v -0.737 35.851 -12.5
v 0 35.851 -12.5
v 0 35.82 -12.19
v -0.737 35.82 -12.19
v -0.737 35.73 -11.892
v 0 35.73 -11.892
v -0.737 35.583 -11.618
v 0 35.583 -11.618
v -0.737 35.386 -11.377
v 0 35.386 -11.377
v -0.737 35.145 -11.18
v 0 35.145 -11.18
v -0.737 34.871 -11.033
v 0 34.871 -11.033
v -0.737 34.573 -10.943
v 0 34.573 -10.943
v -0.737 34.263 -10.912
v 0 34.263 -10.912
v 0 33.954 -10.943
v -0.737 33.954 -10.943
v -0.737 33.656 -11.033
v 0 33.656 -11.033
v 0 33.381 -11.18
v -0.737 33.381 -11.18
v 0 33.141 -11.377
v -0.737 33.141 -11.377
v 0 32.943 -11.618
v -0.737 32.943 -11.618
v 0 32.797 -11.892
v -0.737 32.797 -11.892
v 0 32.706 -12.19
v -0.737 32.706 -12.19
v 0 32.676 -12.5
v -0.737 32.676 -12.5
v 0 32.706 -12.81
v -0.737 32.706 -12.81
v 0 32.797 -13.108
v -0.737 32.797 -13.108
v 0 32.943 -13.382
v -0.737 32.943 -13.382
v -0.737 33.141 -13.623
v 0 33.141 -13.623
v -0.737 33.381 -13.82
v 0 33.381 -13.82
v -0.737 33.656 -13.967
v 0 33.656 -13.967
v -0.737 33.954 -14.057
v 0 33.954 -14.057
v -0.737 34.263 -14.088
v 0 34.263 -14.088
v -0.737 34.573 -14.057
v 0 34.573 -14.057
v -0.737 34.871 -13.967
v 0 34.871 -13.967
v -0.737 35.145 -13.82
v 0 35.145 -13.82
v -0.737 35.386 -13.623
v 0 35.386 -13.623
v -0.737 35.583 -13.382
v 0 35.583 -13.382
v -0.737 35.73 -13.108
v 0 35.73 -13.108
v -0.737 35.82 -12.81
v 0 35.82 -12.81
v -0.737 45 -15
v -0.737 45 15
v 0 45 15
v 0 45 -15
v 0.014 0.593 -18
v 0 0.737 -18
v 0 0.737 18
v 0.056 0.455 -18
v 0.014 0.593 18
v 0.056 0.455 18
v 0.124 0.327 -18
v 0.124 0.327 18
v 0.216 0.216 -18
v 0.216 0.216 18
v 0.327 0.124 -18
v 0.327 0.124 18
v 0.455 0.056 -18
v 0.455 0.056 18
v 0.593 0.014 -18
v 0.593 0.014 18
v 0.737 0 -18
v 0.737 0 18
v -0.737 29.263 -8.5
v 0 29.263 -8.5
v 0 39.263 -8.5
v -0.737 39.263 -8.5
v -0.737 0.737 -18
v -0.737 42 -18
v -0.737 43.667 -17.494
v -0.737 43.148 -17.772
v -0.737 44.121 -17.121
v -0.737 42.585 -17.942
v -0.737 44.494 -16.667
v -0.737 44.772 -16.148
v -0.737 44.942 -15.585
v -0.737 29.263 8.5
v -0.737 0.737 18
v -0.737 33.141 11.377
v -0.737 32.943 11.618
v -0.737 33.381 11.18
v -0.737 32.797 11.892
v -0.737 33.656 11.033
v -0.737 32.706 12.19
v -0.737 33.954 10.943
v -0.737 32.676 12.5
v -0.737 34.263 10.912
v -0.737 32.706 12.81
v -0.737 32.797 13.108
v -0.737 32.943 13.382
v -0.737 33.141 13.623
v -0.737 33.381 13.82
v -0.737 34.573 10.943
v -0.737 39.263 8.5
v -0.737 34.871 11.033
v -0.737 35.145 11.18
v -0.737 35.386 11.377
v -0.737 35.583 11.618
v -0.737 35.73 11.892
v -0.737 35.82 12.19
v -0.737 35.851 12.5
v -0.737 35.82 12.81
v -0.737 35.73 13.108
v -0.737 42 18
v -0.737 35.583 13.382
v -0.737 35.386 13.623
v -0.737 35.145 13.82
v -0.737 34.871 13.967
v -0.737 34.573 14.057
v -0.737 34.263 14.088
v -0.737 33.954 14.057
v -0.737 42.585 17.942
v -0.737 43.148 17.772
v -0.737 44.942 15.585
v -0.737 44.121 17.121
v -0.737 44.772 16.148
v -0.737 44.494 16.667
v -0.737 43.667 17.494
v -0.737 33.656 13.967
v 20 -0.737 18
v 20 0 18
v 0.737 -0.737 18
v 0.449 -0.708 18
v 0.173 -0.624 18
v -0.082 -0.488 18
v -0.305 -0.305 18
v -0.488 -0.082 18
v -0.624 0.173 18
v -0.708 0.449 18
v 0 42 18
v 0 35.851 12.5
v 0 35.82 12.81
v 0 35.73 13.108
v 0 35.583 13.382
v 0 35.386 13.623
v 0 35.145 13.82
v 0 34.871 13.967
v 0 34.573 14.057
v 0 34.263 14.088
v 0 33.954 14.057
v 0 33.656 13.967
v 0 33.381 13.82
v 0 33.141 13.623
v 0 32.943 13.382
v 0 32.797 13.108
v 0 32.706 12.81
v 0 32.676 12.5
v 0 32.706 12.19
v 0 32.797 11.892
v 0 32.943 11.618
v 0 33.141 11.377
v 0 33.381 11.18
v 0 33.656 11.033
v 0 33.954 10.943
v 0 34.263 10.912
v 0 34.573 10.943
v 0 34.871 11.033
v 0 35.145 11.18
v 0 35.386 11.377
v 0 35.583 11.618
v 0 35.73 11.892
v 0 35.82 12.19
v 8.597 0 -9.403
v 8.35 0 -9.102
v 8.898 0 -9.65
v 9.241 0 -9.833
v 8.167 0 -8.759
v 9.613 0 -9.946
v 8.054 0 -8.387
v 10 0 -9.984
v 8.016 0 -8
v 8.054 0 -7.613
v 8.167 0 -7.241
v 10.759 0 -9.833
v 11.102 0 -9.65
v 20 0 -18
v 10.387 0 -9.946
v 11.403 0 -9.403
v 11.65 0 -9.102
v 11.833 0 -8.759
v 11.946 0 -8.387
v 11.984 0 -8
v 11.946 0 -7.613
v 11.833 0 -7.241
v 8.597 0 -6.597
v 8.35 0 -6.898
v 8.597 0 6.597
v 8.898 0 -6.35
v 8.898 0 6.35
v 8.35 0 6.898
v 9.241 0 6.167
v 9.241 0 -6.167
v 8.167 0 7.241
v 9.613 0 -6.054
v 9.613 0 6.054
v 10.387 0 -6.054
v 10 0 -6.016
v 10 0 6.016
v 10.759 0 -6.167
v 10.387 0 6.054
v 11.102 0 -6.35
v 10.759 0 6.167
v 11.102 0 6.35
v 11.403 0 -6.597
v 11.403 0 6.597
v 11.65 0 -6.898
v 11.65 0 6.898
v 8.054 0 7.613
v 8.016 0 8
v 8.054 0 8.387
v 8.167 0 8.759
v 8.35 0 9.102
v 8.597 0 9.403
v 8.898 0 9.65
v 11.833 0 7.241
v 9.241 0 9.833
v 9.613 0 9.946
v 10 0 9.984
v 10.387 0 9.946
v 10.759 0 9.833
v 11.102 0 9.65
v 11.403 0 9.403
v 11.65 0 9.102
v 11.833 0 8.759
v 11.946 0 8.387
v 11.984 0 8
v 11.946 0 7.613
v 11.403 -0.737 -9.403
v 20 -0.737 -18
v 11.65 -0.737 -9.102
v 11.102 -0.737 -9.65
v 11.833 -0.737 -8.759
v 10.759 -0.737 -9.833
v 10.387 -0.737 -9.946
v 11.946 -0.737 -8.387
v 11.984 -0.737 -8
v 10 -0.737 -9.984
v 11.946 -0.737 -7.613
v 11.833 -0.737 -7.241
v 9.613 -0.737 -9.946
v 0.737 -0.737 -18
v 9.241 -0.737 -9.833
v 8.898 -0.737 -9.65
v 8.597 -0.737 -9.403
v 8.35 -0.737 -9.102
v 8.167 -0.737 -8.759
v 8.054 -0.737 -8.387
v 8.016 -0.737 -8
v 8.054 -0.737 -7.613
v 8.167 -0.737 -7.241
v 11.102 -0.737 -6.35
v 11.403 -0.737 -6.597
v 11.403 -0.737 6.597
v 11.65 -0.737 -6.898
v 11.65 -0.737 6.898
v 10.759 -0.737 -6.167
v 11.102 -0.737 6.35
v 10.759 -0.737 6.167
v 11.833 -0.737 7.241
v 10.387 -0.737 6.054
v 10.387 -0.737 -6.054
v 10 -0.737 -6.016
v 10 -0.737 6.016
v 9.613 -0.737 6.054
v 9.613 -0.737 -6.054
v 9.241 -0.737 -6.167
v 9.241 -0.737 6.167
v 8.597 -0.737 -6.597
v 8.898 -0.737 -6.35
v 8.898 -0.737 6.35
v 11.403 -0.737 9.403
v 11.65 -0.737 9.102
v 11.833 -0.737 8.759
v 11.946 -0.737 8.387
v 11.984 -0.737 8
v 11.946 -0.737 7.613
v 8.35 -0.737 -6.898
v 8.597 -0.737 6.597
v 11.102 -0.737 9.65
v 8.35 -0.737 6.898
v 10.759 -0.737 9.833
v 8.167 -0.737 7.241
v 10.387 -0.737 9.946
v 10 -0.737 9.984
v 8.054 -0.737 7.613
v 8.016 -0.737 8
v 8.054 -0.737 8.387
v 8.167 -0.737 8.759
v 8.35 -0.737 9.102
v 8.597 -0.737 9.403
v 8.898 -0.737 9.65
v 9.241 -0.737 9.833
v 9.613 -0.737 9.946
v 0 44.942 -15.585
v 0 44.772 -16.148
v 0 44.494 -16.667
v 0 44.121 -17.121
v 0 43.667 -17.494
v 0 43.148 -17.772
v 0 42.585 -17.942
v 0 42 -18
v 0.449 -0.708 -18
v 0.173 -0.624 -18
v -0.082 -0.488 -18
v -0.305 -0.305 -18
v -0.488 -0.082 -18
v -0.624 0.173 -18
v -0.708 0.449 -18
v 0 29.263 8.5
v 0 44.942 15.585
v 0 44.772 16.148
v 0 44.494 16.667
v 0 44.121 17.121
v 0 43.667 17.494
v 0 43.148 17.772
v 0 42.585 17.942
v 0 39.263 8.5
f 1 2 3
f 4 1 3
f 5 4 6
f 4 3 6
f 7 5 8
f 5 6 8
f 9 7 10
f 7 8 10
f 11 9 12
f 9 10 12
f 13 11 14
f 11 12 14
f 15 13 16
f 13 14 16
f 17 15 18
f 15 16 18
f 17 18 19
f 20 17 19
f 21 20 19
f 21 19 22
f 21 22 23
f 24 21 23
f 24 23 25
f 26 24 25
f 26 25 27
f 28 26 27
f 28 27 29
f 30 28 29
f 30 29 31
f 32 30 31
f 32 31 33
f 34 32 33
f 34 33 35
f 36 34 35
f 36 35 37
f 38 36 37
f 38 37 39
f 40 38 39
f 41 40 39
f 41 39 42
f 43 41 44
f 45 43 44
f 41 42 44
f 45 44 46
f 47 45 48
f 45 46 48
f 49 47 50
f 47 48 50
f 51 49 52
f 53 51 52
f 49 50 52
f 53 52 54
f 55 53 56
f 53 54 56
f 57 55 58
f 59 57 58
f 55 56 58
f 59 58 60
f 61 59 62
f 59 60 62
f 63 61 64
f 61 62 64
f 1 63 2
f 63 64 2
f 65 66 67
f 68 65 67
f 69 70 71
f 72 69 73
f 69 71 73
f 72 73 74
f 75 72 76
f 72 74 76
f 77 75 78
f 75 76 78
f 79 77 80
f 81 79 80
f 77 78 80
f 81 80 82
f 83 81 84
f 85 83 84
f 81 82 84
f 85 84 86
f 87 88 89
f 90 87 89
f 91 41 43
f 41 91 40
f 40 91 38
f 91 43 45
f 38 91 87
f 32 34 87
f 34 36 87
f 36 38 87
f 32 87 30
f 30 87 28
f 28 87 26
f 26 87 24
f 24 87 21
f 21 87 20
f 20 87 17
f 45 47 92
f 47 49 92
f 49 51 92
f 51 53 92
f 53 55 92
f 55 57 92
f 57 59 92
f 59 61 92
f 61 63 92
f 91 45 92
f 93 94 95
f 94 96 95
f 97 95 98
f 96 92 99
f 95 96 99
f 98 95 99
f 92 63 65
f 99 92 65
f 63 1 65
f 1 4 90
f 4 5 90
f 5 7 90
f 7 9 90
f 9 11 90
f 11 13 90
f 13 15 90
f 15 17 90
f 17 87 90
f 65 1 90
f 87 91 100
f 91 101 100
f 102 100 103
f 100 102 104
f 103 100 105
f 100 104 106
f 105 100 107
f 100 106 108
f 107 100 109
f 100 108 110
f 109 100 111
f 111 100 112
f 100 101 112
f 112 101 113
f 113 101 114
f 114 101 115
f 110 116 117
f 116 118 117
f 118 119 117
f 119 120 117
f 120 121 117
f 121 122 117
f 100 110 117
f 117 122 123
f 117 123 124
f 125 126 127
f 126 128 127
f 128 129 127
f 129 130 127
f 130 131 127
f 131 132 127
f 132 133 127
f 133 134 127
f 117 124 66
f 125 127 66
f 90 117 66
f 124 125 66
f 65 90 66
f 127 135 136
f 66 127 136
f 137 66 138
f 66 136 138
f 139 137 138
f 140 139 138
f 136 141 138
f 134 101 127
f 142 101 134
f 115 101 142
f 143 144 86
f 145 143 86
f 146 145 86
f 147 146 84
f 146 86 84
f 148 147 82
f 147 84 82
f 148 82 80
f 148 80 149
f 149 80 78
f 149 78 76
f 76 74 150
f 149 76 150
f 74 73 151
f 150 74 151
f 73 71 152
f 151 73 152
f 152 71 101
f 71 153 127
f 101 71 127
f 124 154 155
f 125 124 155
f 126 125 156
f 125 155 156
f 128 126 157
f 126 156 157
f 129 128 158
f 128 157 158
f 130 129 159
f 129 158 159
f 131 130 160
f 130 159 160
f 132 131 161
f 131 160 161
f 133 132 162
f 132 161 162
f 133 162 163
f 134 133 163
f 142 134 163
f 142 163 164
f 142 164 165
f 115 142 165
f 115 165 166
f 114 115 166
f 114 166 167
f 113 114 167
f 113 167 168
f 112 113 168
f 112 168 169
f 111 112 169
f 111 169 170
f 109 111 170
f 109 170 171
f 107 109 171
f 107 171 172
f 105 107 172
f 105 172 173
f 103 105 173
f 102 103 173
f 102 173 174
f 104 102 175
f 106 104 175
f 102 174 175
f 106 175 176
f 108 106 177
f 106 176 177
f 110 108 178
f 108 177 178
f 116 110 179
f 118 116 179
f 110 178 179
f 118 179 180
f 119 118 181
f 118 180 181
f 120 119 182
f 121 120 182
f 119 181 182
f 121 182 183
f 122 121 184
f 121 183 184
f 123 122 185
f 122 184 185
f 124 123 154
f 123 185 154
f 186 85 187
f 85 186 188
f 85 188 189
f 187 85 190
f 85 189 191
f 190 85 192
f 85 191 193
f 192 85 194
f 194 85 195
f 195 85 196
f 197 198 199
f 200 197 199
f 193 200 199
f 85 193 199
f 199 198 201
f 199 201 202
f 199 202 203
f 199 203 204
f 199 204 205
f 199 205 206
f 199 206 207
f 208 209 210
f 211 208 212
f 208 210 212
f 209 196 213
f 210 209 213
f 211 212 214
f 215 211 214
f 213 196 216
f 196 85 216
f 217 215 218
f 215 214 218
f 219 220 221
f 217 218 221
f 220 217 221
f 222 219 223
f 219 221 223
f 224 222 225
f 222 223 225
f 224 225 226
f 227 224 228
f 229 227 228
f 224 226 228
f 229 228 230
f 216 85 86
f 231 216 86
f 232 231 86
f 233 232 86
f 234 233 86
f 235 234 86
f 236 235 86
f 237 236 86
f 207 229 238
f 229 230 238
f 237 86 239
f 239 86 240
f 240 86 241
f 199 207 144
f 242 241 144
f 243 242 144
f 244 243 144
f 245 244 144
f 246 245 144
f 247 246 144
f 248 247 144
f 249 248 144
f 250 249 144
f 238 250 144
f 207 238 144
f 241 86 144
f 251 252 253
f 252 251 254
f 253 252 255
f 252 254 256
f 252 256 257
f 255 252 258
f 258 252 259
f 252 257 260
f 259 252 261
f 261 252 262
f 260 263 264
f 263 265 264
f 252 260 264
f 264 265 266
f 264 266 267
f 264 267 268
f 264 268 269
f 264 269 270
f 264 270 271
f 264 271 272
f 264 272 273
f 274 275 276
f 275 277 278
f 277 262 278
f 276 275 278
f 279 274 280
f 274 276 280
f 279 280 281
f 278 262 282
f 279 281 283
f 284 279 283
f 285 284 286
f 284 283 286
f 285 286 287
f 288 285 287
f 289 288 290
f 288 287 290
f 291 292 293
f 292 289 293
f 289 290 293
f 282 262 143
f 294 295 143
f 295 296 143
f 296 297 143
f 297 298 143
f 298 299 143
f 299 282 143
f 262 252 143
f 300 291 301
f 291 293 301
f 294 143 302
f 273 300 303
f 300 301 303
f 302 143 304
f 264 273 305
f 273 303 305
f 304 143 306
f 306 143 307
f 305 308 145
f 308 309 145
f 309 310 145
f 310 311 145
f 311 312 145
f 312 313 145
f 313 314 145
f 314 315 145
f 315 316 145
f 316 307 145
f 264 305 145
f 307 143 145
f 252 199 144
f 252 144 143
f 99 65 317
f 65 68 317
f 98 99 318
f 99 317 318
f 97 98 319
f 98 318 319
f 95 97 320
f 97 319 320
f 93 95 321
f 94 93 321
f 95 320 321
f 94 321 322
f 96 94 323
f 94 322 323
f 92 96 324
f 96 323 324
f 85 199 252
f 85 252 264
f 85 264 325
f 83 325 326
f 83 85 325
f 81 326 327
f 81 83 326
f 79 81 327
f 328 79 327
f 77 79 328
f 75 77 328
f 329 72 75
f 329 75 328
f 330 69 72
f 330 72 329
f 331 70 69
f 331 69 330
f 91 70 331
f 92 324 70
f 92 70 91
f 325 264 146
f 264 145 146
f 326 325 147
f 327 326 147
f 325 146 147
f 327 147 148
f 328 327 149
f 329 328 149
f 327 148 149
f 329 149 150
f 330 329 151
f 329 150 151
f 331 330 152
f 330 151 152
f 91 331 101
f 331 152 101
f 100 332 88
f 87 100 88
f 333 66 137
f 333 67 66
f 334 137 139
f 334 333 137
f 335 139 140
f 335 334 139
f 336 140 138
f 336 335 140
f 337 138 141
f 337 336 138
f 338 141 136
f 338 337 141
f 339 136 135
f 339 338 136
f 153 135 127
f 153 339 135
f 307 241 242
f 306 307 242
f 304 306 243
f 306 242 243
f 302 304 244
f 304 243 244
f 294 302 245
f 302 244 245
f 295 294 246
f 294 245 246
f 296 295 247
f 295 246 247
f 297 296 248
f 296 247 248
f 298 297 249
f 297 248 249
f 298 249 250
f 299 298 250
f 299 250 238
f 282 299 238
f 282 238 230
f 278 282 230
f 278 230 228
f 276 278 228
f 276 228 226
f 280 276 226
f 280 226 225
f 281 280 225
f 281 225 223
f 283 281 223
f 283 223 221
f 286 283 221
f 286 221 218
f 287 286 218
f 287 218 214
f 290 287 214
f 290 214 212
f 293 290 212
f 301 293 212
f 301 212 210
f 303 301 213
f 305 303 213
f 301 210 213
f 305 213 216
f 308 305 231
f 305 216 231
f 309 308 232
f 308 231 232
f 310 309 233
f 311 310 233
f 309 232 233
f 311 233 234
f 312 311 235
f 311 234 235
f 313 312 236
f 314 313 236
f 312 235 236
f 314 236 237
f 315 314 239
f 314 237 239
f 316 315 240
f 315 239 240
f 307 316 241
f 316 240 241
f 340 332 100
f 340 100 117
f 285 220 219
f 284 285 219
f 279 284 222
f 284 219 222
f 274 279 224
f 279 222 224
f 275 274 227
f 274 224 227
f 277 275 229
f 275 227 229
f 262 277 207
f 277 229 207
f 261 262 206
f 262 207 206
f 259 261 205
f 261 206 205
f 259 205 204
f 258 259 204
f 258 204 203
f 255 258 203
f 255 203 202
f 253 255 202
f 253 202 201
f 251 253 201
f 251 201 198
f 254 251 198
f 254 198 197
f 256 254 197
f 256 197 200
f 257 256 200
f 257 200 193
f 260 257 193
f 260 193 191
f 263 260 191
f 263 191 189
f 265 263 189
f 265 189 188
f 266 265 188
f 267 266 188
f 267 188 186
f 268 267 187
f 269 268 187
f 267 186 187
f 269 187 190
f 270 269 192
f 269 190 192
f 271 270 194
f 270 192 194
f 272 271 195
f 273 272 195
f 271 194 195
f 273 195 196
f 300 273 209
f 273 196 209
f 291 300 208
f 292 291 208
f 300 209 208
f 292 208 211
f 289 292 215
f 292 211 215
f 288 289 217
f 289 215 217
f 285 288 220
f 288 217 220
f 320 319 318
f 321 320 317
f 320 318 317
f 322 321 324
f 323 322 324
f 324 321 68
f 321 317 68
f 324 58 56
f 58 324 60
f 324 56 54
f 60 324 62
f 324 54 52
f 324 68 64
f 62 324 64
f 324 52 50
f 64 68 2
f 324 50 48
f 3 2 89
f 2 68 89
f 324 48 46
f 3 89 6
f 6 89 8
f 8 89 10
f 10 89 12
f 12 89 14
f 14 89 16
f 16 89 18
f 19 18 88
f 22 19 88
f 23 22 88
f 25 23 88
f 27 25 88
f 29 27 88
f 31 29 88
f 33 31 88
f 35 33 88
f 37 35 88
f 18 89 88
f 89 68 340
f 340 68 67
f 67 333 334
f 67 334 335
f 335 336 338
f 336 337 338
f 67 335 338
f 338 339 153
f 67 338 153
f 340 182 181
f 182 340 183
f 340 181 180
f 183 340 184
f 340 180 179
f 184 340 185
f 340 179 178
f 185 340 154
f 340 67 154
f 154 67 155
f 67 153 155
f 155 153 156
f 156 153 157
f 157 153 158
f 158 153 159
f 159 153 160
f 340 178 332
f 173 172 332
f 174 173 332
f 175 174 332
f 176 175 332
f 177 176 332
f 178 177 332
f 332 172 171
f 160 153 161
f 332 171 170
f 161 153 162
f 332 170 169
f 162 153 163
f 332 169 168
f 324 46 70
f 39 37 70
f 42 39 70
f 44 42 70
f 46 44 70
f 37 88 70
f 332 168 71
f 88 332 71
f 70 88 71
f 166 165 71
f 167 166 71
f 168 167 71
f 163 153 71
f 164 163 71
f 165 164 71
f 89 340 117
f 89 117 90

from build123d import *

# Parameters (mm, degrees)
BASE_FLANGE1_DEPTH = 18
SKETCH6_R          = 1.5875
SKETCH6_W          = 17
SKETCH6_H          = 10
CUT_EXTRUDE1_DEPTH = 53.430906916
SKETCH7_R          = 1.984375
CUT_EXTRUDE2_DEPTH = 53.430906916
FILLET1_R          = 3


# Sheet-metal steps are written as plain solids
with BuildPart() as part:
    # Sketch1 → Base-Flange1 (new, symmetric)
    with BuildSketch(Plane.XY):
        with BuildLine():
            Line((0, 45), (0, 0.7366))
            ThreePointArc((0, 0.7366), (0.215745145, 0.215745145), (0.7366, 0))
            Line((0.7366, 0), (20, 0))
            Line((20, 0), (20, -0.7366))
            Line((20, -0.7366), (0.7366, -0.7366))
            ThreePointArc((0.7366, -0.7366), (-0.30510971, -0.30510971), (-0.7366, 0.7366))
            Line((-0.7366, 0.7366), (-0.7366, 45))
            Line((-0.7366, 45), (0, 45))
        make_face()
    extrude(amount=BASE_FLANGE1_DEPTH, both=True)

    # Sketch6 → Cut-Extrude1 (cut, through all)
    with BuildSketch(Plane(origin=(0, 0, 0), x_dir=(0, 0, -1), z_dir=(1, 0, 0))):
        with Locations(Location((-12.5, 34.2634, 0), (0, 0, 90))):
            Circle(SKETCH6_R)
        with Locations(Location((12.5, 34.2634, 0), (0, 0, 90))):
            Circle(SKETCH6_R)
        with Locations((0, 34.2634)):
            Rectangle(SKETCH6_W, SKETCH6_H)
    extrude(amount=-CUT_EXTRUDE1_DEPTH, mode=Mode.SUBTRACT)

    # Sketch7 → Cut-Extrude2 (cut, through all)
    with BuildSketch(Plane(origin=(0, 0, 0), x_dir=(1, 0, 0), z_dir=(0, 1, 0))):
        with Locations(Location((10, 8, 0), (0, 0, 270))):
            Circle(SKETCH7_R)
        with Locations(Location((10, -8, 0), (0, 0, 270))):
            Circle(SKETCH7_R)
    extrude(amount=-CUT_EXTRUDE2_DEPTH, mode=Mode.SUBTRACT)

    # Fillet1
    fillet1_edges = [part.edges().sort_by_distance(p)[0] for p in [
        (-0.3683, 45, 18),
        (-0.3683, 45, -18),
    ]]
    fillet(fillet1_edges, radius=FILLET1_R)


solid = part.part
